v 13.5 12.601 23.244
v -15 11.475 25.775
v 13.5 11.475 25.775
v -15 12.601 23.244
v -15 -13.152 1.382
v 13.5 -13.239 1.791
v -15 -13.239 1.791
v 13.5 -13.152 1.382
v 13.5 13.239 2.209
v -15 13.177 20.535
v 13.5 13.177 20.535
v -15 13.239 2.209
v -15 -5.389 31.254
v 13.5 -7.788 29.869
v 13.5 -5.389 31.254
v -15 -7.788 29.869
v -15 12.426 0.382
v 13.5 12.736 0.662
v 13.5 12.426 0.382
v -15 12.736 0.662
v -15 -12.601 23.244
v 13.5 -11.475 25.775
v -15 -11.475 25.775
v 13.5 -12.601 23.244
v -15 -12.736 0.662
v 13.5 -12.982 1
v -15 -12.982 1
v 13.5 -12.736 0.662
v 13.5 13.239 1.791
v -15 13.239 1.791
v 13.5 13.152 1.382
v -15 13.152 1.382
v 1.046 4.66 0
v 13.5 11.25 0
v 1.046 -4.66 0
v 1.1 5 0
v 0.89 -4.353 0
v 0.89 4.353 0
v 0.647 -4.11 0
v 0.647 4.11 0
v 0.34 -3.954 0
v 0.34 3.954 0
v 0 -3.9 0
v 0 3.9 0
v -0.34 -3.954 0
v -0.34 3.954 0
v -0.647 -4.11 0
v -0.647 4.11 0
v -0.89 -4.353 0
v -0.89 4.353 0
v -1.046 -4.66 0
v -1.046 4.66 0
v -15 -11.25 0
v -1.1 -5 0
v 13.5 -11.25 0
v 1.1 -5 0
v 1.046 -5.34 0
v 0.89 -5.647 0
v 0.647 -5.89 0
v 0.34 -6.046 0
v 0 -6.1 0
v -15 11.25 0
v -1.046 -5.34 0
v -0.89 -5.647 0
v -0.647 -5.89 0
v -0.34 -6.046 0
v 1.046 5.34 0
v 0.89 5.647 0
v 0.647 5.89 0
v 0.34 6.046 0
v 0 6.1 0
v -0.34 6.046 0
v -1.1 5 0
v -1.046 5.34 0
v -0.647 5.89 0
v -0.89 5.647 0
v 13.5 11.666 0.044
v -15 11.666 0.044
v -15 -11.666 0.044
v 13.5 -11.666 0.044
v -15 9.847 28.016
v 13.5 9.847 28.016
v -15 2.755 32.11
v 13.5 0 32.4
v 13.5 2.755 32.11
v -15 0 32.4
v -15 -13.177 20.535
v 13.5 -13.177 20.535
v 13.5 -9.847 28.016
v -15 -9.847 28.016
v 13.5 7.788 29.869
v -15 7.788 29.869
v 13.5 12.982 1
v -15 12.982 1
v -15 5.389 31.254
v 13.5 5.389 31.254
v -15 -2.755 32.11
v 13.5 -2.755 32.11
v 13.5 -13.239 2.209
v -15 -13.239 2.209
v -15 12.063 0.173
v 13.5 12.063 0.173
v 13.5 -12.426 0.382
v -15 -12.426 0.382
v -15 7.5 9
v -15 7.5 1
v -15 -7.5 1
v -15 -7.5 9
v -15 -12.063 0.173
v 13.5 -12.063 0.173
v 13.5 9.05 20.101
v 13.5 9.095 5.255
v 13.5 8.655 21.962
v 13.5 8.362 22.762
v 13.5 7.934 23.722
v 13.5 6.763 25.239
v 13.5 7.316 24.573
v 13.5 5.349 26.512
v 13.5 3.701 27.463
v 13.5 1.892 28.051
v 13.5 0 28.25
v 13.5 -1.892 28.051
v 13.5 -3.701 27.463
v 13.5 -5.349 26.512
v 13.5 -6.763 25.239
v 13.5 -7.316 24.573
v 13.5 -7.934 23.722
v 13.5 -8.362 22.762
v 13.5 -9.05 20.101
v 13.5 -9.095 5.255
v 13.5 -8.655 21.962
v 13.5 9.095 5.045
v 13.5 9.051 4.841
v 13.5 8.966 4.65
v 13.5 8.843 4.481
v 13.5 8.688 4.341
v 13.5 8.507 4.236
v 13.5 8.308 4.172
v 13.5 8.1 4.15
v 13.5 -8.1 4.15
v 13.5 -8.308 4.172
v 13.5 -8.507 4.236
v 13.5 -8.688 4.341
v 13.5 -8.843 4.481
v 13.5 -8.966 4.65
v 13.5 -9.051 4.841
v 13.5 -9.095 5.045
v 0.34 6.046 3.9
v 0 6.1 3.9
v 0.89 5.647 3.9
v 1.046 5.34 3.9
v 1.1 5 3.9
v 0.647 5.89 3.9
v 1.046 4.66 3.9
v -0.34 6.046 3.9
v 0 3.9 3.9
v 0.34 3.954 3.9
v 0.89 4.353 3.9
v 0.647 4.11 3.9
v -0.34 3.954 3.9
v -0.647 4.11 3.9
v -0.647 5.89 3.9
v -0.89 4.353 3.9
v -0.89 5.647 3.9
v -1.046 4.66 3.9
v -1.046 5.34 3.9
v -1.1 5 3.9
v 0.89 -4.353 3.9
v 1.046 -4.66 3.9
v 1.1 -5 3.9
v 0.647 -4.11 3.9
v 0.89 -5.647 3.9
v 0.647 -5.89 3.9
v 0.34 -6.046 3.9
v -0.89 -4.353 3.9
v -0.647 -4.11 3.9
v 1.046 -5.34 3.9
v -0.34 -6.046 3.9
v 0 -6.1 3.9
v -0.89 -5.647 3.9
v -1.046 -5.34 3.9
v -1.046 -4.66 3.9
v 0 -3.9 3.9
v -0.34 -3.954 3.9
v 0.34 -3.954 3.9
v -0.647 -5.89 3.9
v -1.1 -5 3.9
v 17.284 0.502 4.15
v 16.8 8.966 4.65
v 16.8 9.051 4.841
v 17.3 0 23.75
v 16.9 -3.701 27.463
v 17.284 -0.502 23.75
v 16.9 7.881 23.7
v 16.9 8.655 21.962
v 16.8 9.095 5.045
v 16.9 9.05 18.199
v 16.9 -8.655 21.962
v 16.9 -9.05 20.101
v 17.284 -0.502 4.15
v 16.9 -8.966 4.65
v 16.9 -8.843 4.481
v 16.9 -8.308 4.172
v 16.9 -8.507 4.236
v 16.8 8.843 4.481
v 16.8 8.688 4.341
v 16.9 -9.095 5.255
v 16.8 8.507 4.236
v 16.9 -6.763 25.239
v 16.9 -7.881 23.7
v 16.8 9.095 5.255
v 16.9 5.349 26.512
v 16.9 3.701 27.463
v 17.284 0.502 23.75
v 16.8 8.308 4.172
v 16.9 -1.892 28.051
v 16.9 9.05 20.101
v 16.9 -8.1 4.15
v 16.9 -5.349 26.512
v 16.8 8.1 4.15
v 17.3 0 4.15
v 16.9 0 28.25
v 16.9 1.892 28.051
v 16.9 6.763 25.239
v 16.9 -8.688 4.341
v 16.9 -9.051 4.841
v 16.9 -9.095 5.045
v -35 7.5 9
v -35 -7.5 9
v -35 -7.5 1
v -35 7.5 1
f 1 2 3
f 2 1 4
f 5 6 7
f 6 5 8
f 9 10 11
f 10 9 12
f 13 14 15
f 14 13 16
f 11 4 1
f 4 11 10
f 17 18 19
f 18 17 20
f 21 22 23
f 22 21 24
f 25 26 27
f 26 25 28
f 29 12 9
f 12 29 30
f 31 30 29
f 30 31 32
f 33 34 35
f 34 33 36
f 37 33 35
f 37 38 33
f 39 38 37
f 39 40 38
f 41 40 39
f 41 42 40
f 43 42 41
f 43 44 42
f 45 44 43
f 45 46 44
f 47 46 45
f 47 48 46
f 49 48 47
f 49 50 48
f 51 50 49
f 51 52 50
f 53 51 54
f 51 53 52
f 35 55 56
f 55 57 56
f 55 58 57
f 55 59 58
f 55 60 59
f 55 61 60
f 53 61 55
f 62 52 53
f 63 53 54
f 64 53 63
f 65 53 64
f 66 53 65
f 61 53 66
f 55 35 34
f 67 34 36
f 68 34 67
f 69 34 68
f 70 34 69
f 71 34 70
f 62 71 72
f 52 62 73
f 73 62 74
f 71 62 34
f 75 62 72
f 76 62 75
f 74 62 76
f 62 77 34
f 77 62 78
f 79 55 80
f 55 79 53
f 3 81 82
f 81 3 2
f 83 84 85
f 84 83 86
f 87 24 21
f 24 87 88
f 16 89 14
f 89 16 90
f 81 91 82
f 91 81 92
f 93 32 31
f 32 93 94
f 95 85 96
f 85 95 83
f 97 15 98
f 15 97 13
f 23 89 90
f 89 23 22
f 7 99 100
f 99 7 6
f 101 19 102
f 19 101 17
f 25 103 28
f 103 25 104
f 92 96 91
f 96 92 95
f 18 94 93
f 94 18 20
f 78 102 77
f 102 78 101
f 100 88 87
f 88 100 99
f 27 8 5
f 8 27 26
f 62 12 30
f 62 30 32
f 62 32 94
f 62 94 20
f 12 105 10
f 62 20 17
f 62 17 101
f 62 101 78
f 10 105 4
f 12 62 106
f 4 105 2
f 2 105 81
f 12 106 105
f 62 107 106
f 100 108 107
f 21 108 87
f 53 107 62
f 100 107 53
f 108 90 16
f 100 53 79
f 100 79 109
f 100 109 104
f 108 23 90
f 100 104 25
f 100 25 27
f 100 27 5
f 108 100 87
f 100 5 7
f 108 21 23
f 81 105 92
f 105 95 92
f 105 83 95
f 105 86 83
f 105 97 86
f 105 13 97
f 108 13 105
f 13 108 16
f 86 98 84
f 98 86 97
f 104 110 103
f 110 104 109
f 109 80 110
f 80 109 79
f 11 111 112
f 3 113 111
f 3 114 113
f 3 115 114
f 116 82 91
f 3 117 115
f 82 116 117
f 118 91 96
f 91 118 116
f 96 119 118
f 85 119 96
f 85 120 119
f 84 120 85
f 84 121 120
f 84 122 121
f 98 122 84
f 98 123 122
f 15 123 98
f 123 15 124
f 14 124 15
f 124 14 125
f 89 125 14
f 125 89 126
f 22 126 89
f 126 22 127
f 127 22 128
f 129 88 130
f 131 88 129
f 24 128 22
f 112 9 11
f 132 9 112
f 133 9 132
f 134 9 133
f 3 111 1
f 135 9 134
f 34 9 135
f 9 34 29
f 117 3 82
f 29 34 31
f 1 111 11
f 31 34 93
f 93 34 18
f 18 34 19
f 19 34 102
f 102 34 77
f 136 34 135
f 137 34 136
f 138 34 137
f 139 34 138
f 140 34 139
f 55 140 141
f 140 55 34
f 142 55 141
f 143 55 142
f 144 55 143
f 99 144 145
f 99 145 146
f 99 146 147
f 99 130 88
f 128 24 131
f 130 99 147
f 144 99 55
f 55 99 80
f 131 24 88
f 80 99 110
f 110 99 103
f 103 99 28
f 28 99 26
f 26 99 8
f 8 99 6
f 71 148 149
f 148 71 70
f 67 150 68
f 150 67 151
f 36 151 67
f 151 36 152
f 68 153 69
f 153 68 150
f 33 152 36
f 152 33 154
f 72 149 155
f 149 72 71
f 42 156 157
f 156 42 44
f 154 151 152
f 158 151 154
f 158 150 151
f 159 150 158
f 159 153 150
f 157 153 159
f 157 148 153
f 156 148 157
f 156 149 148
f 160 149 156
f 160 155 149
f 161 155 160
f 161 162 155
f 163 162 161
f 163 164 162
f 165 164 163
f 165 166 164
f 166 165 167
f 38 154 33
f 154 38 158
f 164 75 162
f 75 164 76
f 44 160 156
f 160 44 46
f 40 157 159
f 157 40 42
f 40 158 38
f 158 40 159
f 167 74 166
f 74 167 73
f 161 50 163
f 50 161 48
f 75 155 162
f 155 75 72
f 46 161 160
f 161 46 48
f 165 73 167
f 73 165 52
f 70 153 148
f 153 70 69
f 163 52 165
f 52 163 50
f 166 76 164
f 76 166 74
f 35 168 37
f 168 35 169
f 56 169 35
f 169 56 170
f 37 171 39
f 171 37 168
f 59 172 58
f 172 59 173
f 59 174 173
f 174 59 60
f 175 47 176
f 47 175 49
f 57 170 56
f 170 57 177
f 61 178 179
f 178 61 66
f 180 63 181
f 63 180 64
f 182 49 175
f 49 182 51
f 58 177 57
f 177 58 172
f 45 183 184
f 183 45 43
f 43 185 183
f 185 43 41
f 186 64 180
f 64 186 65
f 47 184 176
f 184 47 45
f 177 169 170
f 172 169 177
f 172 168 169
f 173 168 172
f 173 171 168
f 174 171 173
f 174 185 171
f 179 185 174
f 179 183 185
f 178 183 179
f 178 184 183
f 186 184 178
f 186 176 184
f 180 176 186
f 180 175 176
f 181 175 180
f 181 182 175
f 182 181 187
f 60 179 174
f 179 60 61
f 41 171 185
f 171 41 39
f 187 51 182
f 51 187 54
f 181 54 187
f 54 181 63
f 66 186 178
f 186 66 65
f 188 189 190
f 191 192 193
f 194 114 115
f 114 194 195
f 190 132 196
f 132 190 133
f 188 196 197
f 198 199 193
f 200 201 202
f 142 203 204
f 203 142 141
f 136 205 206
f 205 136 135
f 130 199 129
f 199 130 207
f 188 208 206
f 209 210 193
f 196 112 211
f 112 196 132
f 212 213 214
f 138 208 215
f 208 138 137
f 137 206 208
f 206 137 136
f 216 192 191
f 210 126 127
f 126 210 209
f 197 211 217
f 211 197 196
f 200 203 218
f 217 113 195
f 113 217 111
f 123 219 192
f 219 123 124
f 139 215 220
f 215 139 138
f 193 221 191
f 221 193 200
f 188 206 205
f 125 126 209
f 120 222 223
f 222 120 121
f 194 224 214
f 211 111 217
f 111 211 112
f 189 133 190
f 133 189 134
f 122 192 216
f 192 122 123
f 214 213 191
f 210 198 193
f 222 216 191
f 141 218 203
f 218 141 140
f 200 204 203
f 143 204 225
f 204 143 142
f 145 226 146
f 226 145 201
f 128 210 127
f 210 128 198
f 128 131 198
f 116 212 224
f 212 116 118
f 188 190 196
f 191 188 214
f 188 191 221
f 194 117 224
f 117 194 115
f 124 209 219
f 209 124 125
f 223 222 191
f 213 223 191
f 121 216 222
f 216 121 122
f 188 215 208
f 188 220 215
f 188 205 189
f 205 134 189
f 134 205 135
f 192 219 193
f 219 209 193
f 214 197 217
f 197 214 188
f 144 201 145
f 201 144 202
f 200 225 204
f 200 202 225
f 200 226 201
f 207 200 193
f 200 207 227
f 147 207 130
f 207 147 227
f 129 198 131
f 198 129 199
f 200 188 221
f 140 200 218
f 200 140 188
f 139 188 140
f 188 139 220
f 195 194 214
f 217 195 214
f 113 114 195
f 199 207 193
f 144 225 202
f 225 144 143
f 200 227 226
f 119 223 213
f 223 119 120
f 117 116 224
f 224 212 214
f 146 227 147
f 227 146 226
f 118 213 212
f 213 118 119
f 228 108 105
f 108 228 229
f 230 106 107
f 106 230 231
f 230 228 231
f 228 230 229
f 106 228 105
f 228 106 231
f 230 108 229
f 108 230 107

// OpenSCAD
/** simplified mesh for the Facebook DIGIT tactile sensor.
 * 
 * (c) 2022, fnh, hendrich@informatik.uni-hamburg.de
 */
 
 digit_sensor();
 
 
 /**
  * simplified model of the DIGIT sensor.
  * Sensor points towards +x, origin is at the bottom.
  */
 module digit_sensor( usb_connector=[20,15,8], M2_bore=2.2 ) {
   w = 26.5;
   h = 32.4;  // without top ridge
   hh = 33.7; // with ridge  
   l  = 28.5; // without gel
   ll = 32.3; // with gel
   gw = 18.2; // gel width
   gh = 24.6; // gel height
   ss = 10.0; // distance between screws
   sl = 15.0; // screw center from back face
   rb =  2.0; // bottom bevel radius
   uh =  5.0; 
   uw =  9.9;
   ur =  2.0;
   ul =  4.0;

   rc = w/2;  // radius of main housing
   rd = gw/2; // top radius of gel
   re = 1;    // bottom radius of gel part
   border = (w - gw) / 2;

   color( [0.1,0.1,0.1,1.0] )    
   translate( [-sl,0,0] ) 
   difference() {
     hull() {
       translate( [0,+w/2-rb,rb] ) 
         rotate( [0,90,0] ) 
           cylinder( r=rb, h=l, center=false, $fn=30 );
       translate( [0,-w/2+rb,rb] ) 
         rotate( [0,90,0] ) 
           cylinder( r=rb, h=l, center=false, $fn=30 );
       translate( [0,0,h-rc] ) 
         rotate( [0,90,0] ) 
           cylinder( r=rc, h=l, center=false, $fn=30 );
     }
     
     // mounting screws
     translate( [sl, +ss/2, -0.1] ) cylinder( d=M2_bore, h=4, center=false, $fn=20 );
     translate( [sl, -ss/2, -0.1] ) cylinder( d=M2_bore, h=4, center=false, $fn=20 );
   }
   
   color( "white" )
   translate( [-sl,0,0] ) 
   hull() {
     translate( [l,+gw/2-re,border+re] ) 
       rotate( [0,90,0] ) 
         cylinder( r=re, h=ll-l-0.5, center=false, $fn=30 );
     translate( [l,-gw/2+re,border+re] ) 
       rotate( [0,90,0] ) 
         cylinder( r=re, h=ll-l-0.4, center=false, $fn=30 );
     translate( [l,0,h-border-rd] ) 
       rotate( [0,90,0] ) 
         cylinder( r=rd, h=ll-l-0.4, center=false, $fn=30 );
     translate( [ll-8,0,border] )
       cylinder( r=8, h=gh-5, center=false, $fn=100 );
   }
   
   // usb plug
   color( "blue" )
   hull() {
     translate( [-sl-0.1,-uw/2,uh] ) 
       rotate( [0,90,0] ) 
         cylinder( r=ur, h=ul, center=false, $fn=30 );
     translate( [-sl-0.1,+uw/2,uh] ) 
       rotate( [0,90,0] ) 
         cylinder( r=ur, h=ul, center=false, $fn=30 );
   }
   
   // usb connector (if non-zero)
   if (len(usb_connector) == 3) {
     color( "orange" )
     translate( [-sl-usb_connector[0]/2, 0,uh] ) 
       cube( size=usb_connector, center=true );
   }
}
 
